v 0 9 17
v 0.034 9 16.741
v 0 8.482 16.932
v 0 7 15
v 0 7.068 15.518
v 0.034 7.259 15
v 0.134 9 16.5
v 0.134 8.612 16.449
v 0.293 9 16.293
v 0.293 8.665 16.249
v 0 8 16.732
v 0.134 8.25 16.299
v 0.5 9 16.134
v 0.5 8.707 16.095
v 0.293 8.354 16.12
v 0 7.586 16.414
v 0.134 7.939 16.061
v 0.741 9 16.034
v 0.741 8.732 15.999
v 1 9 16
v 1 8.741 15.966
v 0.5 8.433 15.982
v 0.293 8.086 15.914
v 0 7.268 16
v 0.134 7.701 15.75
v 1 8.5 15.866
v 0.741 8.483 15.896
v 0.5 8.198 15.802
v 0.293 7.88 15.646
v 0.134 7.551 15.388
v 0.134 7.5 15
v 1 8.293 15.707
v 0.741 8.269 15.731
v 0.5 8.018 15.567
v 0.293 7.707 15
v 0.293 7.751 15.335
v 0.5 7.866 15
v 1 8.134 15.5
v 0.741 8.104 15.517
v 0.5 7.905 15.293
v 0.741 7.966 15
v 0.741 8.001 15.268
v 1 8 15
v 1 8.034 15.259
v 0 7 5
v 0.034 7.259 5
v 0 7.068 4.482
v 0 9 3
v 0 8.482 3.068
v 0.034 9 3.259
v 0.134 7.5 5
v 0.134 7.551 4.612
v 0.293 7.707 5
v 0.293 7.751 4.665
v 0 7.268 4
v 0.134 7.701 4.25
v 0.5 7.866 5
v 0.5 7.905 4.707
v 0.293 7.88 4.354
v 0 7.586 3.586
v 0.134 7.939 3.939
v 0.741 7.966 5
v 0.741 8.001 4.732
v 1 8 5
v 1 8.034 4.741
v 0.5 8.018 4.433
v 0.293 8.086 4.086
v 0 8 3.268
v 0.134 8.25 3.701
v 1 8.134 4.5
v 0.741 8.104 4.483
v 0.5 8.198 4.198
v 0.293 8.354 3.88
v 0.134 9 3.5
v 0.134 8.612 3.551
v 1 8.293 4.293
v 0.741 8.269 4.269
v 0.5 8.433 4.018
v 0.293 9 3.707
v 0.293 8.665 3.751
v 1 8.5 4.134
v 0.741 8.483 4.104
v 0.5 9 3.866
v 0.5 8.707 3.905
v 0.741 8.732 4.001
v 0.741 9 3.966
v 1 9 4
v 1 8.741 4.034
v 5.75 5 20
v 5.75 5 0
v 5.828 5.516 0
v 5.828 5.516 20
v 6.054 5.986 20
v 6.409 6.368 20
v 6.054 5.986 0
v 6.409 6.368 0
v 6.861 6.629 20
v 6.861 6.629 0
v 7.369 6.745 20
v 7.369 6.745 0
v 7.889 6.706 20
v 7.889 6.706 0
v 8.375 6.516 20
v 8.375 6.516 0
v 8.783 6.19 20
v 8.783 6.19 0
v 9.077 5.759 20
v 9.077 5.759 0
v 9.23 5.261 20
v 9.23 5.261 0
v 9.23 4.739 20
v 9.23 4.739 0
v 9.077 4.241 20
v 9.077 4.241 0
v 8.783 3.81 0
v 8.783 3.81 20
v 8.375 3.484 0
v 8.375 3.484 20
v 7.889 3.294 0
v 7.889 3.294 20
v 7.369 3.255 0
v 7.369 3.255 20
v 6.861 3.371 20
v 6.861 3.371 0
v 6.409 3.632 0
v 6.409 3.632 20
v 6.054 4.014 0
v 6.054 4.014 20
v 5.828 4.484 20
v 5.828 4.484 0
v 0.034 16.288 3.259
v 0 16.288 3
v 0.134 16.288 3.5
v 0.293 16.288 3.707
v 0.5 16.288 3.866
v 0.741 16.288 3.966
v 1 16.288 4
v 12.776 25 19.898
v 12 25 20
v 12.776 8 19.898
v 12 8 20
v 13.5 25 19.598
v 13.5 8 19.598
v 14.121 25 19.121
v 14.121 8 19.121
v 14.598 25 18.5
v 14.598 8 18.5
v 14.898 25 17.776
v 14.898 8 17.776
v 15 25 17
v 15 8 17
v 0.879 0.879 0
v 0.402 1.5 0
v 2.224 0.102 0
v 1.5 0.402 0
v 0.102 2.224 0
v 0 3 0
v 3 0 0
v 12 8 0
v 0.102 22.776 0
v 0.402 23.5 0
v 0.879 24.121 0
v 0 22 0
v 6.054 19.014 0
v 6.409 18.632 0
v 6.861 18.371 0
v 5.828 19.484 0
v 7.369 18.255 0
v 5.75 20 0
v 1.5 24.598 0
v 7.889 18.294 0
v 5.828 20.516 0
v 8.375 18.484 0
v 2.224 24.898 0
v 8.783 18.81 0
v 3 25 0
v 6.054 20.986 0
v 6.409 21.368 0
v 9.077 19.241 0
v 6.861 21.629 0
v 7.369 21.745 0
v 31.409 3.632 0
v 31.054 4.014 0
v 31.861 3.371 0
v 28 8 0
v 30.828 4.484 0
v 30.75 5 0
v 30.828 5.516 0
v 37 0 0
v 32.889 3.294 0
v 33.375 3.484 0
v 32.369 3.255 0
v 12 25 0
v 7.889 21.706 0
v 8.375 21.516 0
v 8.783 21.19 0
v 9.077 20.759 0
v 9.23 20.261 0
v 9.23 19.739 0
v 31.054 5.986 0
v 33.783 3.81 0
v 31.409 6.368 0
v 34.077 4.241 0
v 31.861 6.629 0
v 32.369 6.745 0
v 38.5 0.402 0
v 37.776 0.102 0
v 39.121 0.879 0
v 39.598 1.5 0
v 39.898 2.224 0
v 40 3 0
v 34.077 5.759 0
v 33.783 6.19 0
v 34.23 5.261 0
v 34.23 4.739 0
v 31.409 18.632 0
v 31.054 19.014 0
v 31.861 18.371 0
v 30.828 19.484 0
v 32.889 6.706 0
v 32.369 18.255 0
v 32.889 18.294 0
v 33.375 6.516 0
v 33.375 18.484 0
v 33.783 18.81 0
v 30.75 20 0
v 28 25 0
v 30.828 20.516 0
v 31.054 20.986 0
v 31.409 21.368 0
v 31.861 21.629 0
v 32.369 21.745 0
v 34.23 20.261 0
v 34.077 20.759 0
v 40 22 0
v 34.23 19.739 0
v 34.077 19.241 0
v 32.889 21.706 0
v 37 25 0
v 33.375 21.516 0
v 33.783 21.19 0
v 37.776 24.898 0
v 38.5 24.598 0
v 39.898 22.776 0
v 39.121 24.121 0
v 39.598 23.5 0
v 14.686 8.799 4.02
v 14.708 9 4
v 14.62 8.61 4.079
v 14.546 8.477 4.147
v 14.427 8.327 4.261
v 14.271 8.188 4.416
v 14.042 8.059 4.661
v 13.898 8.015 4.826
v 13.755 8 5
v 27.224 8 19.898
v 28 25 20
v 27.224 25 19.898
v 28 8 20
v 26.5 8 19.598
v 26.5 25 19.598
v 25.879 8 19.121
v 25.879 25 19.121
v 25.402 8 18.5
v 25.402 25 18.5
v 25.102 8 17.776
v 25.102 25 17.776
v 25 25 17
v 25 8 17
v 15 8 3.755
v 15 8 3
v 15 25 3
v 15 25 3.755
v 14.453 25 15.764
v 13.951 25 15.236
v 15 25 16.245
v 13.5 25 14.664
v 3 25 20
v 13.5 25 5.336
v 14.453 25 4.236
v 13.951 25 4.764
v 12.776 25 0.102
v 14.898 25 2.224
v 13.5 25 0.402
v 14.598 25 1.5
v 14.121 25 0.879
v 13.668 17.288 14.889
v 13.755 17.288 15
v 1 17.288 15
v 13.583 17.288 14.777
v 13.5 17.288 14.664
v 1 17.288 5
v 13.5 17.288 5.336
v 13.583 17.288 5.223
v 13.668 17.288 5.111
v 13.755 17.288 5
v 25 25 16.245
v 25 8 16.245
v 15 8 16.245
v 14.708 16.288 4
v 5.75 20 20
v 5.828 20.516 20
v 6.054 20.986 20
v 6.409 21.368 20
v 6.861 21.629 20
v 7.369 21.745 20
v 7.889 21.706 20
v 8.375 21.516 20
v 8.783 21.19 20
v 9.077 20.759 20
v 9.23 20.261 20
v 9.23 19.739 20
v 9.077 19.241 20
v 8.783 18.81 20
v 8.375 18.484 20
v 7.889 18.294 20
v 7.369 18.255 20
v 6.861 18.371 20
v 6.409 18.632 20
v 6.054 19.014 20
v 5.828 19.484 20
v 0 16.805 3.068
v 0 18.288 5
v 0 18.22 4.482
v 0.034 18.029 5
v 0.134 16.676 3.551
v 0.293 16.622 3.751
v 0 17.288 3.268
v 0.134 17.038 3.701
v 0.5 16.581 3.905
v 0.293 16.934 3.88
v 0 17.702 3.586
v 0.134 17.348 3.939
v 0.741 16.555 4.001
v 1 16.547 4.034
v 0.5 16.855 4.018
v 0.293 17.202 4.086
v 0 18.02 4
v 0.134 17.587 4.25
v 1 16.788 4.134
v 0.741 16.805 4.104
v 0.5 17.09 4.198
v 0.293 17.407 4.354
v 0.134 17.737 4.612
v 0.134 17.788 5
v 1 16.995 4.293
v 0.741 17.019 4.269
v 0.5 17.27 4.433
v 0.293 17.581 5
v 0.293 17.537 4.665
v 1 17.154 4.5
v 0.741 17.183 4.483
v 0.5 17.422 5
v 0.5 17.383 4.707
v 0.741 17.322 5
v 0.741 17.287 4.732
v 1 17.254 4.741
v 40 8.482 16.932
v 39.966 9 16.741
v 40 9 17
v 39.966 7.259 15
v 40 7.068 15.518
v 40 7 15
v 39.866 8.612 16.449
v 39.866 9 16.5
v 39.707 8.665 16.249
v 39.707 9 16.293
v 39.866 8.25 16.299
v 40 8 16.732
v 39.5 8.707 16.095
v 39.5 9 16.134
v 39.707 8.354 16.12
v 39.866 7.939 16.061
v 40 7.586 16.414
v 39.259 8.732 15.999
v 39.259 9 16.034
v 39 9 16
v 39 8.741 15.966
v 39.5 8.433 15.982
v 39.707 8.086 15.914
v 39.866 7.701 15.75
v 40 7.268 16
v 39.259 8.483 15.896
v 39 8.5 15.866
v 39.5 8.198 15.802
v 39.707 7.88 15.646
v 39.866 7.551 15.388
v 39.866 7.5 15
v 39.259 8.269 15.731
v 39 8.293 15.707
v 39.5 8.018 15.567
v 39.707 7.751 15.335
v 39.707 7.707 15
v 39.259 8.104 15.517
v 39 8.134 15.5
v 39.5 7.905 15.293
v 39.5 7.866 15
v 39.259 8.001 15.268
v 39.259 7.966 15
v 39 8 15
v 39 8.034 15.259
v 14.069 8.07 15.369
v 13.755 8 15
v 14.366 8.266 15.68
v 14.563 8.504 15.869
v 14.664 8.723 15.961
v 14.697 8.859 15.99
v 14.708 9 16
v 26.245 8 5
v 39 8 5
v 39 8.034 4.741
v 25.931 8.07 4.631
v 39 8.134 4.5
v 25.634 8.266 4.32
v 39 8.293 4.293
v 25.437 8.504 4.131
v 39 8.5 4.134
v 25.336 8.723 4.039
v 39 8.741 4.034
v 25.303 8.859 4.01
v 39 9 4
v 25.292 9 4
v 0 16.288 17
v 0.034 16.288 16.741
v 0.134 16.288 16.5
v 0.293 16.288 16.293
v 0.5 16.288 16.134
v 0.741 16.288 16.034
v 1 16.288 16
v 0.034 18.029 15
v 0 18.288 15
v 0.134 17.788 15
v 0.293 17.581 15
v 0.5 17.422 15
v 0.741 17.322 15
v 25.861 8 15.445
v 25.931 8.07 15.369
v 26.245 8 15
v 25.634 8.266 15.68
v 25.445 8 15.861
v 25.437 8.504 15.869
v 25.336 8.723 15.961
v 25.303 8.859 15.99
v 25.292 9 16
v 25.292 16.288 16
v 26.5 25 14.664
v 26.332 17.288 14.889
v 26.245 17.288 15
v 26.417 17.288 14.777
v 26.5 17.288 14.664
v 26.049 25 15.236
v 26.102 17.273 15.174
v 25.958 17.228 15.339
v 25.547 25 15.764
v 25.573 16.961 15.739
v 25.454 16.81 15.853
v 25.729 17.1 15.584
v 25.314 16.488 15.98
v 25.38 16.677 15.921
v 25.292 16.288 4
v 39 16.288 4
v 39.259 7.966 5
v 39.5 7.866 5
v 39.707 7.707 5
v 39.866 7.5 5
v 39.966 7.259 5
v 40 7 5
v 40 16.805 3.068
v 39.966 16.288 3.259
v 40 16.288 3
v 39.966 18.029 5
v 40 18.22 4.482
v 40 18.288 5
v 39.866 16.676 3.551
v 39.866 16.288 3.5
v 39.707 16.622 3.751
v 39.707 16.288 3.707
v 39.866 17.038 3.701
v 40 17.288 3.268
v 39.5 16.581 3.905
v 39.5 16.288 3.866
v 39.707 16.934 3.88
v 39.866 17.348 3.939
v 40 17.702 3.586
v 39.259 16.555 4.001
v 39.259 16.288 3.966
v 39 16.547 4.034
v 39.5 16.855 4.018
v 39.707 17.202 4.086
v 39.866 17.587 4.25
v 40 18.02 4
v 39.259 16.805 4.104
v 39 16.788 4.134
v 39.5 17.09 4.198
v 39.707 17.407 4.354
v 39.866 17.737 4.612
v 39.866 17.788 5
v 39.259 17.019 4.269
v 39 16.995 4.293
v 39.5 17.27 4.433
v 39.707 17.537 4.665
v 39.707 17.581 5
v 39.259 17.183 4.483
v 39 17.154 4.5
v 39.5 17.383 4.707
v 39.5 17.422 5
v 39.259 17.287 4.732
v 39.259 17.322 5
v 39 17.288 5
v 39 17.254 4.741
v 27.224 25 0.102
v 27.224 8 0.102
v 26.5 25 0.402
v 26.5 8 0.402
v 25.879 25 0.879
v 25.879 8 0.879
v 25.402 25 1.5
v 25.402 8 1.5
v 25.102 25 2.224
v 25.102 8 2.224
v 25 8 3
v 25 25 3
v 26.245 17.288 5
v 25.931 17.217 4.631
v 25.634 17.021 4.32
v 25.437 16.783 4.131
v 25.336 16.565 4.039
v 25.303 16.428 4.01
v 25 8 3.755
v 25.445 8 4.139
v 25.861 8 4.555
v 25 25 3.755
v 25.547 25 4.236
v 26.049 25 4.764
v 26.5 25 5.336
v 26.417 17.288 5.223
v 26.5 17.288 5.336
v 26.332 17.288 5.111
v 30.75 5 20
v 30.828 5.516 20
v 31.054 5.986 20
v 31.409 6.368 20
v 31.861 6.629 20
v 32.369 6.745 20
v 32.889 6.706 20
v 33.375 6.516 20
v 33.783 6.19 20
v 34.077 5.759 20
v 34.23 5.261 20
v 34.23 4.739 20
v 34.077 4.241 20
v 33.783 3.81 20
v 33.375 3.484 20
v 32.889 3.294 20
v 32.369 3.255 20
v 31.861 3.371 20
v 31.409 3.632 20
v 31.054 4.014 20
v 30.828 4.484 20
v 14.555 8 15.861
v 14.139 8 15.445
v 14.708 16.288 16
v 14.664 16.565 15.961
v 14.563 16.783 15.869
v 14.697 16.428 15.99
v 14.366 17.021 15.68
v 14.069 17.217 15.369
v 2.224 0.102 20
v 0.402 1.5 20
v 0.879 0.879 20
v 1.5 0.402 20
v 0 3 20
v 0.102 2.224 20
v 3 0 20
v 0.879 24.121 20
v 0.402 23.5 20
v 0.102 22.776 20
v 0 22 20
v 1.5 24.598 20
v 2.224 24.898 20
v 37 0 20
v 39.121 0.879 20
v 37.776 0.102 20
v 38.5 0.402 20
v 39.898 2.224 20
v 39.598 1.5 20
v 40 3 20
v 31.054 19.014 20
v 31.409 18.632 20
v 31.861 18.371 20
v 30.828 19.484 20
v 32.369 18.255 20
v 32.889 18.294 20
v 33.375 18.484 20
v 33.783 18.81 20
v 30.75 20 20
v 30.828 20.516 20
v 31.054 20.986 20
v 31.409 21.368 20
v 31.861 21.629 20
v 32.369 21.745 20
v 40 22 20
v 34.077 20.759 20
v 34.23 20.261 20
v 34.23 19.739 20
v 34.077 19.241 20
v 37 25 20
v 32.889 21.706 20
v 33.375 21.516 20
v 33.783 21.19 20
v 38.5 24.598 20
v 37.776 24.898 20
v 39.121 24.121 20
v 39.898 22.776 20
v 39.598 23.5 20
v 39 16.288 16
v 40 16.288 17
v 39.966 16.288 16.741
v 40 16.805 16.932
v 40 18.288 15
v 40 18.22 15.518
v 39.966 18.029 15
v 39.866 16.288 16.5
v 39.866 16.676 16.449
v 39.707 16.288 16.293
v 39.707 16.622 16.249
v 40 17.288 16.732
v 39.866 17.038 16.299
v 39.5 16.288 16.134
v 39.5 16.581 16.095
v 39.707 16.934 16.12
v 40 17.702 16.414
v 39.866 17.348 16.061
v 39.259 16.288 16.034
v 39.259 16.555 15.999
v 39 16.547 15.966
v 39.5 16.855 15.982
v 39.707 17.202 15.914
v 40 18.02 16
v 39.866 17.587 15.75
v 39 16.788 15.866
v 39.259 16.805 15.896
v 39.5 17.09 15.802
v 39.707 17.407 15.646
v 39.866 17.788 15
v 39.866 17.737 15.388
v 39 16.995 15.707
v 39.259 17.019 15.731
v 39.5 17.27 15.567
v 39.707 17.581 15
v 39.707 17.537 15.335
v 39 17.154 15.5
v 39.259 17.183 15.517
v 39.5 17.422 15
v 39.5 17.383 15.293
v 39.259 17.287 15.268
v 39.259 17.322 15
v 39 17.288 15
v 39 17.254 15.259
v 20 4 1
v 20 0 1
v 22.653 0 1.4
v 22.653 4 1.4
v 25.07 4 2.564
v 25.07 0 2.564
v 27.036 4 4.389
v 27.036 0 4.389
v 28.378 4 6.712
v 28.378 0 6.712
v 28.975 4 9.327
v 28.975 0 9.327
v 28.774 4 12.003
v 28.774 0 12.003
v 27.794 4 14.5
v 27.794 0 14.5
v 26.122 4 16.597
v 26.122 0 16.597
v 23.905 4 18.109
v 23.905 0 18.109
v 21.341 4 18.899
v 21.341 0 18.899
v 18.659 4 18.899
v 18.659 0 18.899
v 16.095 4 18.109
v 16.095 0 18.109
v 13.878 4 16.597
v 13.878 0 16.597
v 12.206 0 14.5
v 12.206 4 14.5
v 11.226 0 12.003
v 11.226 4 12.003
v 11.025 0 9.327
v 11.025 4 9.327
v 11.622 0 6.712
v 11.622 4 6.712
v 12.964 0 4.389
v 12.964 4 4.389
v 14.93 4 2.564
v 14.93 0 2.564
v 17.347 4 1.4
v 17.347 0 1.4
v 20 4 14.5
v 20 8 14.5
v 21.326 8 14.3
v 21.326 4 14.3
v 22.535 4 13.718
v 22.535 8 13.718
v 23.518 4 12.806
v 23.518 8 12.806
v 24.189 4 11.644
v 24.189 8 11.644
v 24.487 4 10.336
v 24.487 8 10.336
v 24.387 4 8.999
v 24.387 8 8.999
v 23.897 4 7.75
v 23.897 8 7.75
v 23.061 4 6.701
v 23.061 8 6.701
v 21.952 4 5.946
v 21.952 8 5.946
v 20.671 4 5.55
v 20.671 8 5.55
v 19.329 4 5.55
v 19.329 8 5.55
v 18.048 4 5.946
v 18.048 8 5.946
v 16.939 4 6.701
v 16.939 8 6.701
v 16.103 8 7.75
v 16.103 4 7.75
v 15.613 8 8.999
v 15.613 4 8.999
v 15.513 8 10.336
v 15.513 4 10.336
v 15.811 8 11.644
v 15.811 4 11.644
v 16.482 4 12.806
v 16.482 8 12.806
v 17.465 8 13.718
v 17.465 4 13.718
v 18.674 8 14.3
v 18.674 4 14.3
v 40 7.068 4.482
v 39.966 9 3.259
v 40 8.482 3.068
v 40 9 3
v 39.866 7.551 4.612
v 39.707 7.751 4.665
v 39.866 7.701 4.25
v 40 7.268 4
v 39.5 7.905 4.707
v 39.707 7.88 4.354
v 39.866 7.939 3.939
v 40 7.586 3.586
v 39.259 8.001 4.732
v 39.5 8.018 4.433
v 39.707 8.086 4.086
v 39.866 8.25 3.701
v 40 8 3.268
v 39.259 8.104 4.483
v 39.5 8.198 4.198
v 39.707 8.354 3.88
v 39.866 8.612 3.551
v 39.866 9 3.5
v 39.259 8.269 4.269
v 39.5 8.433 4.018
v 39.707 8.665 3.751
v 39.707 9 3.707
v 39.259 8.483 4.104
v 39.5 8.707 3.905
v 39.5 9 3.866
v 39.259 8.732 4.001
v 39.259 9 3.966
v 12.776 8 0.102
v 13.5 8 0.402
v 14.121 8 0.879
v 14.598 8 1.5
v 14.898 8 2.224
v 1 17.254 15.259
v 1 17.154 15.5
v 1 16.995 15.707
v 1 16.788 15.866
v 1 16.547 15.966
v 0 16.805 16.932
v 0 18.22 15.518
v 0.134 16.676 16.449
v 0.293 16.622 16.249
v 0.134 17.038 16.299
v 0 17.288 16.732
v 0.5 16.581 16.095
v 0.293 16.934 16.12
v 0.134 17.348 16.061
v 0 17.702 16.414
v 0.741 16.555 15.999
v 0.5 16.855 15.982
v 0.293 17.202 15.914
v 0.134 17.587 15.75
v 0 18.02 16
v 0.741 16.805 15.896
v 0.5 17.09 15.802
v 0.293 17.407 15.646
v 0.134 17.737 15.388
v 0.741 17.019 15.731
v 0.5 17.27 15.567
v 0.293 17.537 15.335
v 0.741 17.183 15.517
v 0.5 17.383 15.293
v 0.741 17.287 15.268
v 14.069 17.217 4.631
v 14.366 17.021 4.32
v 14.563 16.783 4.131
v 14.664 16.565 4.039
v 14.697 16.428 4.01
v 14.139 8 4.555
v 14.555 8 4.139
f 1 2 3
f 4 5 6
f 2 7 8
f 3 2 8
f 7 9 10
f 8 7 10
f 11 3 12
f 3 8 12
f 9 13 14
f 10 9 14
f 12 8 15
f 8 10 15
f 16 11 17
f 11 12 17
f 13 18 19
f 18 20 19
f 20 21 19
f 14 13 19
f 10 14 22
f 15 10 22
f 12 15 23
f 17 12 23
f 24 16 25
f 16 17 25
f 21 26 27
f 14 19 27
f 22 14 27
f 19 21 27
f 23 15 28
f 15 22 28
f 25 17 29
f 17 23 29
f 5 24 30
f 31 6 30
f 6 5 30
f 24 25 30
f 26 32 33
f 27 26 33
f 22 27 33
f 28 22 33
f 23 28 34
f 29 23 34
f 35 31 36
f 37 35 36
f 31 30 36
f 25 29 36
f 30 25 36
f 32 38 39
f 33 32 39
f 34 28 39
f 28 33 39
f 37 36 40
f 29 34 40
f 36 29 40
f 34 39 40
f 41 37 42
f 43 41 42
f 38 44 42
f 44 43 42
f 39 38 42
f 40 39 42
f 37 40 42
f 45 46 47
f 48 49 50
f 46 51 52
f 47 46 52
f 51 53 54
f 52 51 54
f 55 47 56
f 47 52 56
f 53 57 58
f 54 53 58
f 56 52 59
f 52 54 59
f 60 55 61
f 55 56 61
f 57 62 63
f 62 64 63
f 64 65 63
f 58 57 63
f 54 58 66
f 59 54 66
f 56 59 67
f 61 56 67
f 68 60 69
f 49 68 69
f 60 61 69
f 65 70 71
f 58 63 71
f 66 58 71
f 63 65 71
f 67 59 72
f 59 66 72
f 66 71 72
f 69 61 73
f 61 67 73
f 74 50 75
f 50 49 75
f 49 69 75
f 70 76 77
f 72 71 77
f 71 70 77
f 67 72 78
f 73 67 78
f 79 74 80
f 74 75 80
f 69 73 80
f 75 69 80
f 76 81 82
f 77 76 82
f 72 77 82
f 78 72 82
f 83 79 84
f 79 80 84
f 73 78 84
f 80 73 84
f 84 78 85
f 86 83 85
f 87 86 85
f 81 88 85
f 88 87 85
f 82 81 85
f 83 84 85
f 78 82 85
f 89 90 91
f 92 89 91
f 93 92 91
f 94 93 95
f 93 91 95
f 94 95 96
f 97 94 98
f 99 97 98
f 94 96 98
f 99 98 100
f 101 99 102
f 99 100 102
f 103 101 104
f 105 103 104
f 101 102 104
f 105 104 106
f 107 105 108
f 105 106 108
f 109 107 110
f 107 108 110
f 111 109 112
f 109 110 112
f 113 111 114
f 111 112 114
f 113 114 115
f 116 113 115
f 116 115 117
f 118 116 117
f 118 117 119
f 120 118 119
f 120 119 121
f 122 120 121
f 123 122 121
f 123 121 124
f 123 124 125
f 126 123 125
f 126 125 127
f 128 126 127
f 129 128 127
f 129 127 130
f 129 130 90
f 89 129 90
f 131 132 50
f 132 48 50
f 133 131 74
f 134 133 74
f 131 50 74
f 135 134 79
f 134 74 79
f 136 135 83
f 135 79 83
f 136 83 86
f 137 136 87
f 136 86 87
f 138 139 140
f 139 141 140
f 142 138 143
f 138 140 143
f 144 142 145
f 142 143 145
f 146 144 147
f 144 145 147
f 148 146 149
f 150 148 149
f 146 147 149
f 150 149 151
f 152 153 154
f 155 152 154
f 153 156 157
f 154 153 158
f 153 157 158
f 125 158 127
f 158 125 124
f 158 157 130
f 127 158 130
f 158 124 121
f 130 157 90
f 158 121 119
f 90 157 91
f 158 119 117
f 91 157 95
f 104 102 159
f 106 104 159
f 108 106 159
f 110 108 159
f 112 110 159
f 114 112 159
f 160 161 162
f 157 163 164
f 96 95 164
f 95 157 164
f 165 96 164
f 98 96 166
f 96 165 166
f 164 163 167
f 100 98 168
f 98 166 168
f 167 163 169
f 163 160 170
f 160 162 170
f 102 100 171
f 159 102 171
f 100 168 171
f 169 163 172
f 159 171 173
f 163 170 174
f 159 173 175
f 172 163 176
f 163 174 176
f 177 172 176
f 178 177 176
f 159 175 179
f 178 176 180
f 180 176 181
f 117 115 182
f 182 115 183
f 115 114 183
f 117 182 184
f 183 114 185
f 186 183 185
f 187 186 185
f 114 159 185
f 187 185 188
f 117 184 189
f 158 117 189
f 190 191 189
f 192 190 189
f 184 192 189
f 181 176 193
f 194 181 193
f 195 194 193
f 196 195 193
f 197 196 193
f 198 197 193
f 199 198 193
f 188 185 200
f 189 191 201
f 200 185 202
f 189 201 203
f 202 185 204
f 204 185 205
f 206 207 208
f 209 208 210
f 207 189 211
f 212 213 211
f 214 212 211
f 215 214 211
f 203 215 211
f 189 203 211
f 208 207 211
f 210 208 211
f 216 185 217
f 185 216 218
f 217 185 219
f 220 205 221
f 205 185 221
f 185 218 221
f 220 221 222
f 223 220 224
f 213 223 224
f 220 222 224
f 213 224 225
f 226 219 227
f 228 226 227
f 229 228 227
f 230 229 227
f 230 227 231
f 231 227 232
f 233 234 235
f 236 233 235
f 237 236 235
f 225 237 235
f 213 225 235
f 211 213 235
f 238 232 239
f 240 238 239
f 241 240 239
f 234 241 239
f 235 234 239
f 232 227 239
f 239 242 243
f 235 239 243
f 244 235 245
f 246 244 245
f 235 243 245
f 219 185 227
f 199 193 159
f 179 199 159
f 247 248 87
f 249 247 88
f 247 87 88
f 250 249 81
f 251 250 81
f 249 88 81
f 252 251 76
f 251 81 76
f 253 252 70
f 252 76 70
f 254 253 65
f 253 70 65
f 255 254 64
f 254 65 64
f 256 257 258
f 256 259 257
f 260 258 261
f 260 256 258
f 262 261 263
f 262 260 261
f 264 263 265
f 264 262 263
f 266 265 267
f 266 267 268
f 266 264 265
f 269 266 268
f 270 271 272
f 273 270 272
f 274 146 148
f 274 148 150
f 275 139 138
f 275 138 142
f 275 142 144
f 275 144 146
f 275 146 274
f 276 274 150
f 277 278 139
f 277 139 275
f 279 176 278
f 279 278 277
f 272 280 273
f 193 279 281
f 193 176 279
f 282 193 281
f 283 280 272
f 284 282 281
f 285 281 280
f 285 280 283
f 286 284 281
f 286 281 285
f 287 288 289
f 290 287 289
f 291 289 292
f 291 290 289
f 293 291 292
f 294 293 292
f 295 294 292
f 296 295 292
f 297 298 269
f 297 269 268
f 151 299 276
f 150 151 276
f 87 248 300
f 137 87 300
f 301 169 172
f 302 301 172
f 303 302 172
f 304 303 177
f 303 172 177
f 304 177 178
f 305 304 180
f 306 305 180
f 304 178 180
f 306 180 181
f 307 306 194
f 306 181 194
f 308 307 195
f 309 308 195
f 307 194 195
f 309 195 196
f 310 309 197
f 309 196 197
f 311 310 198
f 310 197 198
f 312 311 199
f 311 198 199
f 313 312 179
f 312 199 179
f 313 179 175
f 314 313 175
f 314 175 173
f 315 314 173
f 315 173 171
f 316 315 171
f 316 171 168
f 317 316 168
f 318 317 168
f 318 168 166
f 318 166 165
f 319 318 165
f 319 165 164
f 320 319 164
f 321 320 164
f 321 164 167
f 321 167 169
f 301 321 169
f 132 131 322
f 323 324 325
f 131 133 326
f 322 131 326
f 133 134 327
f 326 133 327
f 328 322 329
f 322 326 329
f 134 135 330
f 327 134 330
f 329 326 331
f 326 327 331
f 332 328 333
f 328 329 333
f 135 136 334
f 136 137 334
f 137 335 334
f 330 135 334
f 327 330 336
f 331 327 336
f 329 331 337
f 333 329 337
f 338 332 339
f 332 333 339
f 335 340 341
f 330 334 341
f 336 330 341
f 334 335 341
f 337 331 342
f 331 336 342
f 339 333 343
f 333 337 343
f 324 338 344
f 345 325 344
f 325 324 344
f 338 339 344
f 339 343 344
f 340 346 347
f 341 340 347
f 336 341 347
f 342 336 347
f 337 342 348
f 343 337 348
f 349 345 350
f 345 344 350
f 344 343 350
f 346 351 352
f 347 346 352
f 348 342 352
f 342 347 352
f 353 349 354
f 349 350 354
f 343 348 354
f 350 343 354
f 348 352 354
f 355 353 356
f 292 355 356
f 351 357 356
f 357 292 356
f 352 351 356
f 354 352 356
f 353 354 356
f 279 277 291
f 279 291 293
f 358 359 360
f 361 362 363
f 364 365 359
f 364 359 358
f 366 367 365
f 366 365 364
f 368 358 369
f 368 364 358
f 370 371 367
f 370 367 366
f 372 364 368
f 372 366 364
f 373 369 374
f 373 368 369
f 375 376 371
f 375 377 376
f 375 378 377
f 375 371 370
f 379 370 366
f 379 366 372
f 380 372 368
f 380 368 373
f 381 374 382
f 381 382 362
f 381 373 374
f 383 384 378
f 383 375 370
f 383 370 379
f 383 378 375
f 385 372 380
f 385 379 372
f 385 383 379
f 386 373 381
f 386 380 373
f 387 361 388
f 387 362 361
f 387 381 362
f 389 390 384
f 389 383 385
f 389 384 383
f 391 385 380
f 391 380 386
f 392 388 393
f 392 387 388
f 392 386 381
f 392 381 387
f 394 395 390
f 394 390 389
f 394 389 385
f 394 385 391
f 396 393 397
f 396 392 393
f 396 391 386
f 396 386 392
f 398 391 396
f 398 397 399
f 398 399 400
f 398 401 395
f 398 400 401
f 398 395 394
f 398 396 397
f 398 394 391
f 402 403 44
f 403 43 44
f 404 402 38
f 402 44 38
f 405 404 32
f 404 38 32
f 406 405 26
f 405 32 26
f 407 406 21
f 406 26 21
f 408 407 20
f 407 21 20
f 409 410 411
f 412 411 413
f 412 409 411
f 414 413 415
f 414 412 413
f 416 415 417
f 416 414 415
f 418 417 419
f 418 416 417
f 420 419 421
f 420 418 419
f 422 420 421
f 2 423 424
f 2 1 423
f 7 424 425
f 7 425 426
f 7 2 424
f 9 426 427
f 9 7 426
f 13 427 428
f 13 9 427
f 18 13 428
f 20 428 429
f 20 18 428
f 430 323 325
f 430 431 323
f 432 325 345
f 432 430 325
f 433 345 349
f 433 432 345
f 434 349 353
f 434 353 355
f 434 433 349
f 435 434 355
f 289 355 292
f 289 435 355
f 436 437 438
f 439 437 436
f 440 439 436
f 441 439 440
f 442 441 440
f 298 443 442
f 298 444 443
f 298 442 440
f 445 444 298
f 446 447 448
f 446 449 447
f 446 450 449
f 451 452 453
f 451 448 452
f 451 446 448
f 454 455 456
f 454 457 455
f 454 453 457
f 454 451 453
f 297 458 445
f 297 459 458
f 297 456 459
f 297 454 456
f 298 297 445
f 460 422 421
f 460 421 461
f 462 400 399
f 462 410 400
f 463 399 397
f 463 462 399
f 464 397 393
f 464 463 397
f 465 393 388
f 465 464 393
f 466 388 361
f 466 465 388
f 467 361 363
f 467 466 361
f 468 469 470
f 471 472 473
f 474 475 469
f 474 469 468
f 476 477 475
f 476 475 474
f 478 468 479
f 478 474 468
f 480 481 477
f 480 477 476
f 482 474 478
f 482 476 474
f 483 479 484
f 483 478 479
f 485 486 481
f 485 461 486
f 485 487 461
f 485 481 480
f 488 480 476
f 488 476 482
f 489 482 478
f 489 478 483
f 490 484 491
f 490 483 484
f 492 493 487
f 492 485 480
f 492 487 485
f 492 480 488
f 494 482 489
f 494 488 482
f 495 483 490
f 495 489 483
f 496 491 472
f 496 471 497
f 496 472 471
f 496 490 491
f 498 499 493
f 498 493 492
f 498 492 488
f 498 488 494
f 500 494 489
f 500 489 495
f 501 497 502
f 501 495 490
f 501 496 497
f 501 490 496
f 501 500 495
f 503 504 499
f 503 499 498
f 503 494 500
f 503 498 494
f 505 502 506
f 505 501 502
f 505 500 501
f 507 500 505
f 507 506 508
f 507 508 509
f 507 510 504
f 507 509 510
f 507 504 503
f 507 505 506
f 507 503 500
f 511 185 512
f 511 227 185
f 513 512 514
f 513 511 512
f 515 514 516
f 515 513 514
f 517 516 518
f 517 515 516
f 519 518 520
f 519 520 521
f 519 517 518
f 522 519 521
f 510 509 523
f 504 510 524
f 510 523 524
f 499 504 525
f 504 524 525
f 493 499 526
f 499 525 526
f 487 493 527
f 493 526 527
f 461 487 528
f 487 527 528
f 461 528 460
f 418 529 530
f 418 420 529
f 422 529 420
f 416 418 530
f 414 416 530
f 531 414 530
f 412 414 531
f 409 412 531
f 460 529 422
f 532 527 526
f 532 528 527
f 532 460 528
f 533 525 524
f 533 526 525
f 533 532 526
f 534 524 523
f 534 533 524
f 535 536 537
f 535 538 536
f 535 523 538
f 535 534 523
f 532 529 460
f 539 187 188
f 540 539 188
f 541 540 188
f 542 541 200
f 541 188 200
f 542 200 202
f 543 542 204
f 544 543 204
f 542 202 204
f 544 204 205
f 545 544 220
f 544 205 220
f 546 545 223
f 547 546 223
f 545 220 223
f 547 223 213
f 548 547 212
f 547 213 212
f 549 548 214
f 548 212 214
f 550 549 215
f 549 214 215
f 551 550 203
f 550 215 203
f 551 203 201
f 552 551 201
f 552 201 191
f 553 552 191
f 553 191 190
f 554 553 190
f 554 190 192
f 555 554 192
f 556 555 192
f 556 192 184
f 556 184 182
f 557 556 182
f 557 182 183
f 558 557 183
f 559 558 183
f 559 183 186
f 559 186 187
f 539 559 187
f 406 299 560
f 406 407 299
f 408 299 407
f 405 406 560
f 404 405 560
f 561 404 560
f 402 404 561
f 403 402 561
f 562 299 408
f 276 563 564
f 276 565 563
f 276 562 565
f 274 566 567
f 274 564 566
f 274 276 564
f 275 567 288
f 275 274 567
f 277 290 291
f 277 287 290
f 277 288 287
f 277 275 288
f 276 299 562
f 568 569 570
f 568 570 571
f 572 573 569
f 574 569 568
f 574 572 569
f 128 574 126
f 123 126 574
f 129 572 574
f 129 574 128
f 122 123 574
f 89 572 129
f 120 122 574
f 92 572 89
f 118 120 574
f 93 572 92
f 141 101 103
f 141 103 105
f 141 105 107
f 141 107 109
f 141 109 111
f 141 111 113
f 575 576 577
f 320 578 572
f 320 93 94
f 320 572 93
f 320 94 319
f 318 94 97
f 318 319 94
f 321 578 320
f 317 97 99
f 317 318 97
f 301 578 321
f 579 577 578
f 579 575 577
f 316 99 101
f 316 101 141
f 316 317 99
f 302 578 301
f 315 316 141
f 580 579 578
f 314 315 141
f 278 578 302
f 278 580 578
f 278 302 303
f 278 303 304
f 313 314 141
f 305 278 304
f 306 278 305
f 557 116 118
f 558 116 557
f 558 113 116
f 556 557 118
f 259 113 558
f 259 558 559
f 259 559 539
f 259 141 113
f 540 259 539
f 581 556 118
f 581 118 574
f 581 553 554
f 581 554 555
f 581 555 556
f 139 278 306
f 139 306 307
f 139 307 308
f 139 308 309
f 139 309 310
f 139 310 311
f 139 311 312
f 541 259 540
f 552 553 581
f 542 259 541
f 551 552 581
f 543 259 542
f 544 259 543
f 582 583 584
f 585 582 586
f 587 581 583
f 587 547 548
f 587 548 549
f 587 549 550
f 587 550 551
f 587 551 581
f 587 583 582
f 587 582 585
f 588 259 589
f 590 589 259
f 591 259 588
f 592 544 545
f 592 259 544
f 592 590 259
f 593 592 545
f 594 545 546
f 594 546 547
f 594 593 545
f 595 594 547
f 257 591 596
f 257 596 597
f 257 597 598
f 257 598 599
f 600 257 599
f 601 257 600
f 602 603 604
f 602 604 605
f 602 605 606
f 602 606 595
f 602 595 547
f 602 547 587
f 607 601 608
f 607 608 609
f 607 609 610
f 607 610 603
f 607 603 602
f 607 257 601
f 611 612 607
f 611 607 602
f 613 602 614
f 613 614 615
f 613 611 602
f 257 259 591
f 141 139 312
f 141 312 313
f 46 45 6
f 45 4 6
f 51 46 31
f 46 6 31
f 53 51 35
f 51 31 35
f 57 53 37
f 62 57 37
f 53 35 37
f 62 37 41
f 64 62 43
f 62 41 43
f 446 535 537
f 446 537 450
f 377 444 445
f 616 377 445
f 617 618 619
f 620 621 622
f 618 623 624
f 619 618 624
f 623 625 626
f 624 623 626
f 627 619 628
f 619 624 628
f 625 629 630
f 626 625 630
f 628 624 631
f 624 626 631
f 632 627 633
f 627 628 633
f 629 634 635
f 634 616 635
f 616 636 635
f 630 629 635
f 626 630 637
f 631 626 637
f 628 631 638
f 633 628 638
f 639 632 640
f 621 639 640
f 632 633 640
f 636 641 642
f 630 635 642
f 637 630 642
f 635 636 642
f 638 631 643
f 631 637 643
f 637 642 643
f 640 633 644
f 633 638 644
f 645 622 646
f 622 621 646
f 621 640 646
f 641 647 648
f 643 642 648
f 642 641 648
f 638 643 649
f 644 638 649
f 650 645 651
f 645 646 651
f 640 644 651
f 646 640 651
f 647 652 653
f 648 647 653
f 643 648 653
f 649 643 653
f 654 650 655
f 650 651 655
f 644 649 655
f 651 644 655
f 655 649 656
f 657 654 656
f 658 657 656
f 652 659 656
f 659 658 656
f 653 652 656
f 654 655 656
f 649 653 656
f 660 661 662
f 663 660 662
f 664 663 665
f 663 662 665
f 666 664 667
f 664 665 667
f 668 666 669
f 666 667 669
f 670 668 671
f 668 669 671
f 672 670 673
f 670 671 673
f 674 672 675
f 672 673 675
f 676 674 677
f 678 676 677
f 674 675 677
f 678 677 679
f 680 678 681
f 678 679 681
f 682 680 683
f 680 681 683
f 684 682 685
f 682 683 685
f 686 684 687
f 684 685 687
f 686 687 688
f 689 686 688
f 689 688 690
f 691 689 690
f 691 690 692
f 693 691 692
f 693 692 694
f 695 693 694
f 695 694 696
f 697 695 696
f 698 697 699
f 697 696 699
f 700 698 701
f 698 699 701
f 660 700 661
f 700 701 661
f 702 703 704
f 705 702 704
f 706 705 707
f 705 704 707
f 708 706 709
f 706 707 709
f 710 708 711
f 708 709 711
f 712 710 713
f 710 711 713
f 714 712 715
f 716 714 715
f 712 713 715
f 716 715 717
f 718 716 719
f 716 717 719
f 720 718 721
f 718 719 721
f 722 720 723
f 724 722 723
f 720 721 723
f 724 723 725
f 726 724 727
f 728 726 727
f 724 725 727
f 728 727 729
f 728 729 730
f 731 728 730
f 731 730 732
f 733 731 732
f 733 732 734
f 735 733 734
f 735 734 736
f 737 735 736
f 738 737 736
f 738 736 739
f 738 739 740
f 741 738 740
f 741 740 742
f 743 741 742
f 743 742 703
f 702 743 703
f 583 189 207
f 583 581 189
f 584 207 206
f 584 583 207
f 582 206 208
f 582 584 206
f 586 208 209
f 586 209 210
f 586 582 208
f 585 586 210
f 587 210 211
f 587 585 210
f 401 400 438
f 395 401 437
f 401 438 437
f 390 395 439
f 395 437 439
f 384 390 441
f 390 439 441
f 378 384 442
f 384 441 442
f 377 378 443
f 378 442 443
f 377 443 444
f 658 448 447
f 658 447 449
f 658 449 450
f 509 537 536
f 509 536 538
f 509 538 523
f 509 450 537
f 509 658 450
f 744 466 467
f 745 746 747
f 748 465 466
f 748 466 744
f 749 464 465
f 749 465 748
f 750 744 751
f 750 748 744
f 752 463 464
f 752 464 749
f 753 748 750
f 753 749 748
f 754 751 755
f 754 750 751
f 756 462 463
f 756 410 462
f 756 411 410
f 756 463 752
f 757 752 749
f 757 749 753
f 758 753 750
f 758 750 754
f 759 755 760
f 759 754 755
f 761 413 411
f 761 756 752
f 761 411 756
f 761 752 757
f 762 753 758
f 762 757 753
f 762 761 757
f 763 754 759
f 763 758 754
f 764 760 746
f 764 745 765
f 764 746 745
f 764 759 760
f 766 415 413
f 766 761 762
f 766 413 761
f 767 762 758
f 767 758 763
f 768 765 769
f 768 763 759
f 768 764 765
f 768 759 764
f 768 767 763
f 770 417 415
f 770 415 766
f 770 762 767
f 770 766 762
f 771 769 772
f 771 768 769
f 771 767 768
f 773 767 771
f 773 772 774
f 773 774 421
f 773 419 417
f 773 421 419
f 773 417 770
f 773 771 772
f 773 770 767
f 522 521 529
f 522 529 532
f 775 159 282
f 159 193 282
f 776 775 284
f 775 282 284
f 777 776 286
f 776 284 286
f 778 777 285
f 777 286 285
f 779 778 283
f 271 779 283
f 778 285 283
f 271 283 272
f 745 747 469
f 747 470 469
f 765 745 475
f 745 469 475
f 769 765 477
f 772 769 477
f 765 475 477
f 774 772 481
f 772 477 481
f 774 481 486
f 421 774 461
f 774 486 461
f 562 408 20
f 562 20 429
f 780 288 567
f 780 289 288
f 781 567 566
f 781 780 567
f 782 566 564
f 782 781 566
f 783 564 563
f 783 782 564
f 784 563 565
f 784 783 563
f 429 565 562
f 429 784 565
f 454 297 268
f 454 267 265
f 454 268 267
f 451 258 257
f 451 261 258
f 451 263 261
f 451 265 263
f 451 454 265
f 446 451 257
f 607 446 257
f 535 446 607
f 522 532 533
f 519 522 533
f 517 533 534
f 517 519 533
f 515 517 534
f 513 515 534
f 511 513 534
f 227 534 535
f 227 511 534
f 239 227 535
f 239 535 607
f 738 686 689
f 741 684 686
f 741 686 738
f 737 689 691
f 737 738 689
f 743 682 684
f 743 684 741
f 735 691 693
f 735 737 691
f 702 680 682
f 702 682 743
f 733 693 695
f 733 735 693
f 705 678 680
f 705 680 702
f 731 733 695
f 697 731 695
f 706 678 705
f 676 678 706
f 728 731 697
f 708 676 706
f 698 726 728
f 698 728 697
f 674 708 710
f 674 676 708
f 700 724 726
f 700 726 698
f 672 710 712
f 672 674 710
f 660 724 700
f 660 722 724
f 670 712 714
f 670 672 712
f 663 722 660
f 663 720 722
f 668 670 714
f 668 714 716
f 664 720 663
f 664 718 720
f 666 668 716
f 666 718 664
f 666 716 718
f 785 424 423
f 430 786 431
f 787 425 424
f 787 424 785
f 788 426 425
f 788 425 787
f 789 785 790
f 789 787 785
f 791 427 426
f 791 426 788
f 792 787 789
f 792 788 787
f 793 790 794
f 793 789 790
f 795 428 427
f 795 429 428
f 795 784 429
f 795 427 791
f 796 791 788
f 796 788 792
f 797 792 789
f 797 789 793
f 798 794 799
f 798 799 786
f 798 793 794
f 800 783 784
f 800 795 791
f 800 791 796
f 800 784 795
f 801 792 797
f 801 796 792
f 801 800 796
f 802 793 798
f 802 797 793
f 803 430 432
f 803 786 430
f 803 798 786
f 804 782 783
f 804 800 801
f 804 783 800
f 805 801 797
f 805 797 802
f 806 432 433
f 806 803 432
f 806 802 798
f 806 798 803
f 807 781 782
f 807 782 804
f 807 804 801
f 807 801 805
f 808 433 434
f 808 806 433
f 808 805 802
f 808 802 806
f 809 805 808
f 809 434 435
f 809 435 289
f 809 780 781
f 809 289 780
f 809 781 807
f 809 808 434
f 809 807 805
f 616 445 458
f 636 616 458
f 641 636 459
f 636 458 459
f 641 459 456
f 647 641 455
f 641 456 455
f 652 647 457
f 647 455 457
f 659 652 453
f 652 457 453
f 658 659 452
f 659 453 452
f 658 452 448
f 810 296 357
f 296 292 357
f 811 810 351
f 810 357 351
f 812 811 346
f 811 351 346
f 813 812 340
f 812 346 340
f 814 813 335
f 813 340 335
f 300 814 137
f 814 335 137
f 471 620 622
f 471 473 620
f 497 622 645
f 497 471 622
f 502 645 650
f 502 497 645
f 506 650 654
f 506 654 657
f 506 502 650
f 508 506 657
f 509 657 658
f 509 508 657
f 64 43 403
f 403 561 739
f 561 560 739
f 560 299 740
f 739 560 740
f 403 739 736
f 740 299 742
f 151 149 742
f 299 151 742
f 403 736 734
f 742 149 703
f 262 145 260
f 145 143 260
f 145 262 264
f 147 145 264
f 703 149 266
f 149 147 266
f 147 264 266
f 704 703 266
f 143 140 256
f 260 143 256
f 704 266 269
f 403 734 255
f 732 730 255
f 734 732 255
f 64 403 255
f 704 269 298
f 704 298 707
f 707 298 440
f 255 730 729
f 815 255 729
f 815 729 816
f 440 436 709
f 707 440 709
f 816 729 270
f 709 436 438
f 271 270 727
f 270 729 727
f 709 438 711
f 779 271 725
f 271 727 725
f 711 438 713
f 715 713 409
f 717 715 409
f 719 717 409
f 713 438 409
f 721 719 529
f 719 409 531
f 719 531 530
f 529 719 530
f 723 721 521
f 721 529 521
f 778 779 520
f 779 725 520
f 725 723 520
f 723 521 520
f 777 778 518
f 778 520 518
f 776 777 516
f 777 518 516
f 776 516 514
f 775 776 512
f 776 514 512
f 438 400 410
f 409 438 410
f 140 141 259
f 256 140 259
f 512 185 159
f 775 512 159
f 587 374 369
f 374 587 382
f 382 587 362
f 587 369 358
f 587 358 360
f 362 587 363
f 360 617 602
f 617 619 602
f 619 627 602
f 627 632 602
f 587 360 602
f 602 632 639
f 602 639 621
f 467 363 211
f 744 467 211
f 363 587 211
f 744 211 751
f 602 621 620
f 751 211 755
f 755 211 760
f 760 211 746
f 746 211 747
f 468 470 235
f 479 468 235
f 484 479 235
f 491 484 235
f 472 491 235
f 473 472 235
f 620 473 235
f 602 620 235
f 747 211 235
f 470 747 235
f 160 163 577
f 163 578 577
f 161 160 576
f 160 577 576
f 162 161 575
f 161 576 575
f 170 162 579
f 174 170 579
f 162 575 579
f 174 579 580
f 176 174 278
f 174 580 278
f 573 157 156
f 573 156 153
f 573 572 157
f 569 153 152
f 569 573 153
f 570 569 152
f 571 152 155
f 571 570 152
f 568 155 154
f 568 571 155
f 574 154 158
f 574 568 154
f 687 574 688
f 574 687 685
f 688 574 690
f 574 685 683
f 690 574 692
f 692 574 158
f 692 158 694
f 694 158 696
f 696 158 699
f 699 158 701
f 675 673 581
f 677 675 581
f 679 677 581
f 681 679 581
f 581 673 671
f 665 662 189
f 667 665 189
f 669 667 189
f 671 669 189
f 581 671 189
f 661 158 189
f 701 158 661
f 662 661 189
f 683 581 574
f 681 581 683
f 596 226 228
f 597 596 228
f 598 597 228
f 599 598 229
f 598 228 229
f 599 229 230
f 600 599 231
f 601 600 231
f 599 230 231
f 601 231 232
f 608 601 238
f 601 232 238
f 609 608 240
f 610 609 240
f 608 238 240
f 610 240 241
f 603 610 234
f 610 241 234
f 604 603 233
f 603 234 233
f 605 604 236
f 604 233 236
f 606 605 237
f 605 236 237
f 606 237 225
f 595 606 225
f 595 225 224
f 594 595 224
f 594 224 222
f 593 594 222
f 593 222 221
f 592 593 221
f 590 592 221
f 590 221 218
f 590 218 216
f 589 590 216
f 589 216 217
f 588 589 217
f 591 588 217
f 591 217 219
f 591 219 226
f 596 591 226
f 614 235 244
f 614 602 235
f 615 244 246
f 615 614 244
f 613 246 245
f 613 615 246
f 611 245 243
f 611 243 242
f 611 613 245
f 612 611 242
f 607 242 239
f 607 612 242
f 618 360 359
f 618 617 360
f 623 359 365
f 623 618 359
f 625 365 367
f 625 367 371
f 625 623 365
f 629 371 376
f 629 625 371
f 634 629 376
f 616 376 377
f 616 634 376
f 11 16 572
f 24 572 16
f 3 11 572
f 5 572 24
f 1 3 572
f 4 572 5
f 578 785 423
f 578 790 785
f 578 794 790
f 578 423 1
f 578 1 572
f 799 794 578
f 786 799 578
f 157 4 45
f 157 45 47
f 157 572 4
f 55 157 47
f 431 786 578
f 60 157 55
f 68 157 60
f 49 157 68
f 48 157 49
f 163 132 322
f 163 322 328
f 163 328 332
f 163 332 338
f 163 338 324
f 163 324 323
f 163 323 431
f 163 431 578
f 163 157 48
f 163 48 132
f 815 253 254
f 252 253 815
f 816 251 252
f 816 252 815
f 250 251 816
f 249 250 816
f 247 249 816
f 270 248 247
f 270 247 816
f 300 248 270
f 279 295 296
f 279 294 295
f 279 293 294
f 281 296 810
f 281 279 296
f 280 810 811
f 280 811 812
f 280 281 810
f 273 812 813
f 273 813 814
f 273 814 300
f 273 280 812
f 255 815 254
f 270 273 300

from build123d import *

# Parameters (mm, degrees)
SKETCH_1_W          = 40
SKETCH_1_H          = 25
EXTRUDE_1_DEPTH     = 20
SKETCH_2_R          = 4.5
CUT_EXTRUDE_1_DEPTH = 52.23475383
CUT_EXTRUDE_2_DEPTH = 17
SKETCH_4_R          = 1.75
SKETCH_4_W          = 10
SKETCH_4_H          = 17
CUT_EXTRUDE_3_DEPTH = 52.23475383
FILLET_1_R          = 3
SKETCH_5_R          = 9
CUT_EXTRUDE_4_DEPTH = 4
SKETCH_7_W          = 12
SKETCH_7_H          = 9.287727203
CUT_EXTRUDE_5_DEPTH = 52.23475383
FILLET_2_R          = 1


with BuildPart() as part:
    # 草图1 → 凸台-拉伸1 (new body)
    with BuildSketch(Plane.XY):
        with Locations((20, 12.5)):
            Rectangle(SKETCH_1_W, SKETCH_1_H)
    extrude(amount=EXTRUDE_1_DEPTH)

    # 草图2 → 切除-拉伸1 (cut, through all)
    with BuildSketch(Plane(origin=(0, 25, 0), x_dir=(1, 0, 0), z_dir=(0, 1, 0))):
        with Locations(Location((20, -10, 0), (0, 0, 270))):
            Circle(SKETCH_2_R)
    extrude(amount=-CUT_EXTRUDE_1_DEPTH, mode=Mode.SUBTRACT)

    # 草图3 → 切除-拉伸2 (cut)
    with BuildSketch(Plane(origin=(0, 25, 0), x_dir=(1, 0, 0), z_dir=(0, 1, 0))):
        with BuildLine():
            Line((15.336310473, -3.5), (24.663689527, -3.5))
            ThreePointArc((24.663689527, -3.5), (25.656854249, -4.343145751), (26.5, -5.336310473))
            Line((26.5, -5.336310473), (26.5, -14.663689527))
            ThreePointArc((26.5, -14.663689527), (25.656854249, -15.656854249), (24.663689527, -16.5))
            Line((24.663689527, -16.5), (15.336310473, -16.5))
            ThreePointArc((15.336310473, -16.5), (14.343145751, -15.656854249), (13.5, -14.663689527))
            Line((13.5, -14.663689527), (13.5, -5.336310473))
            ThreePointArc((13.5, -5.336310473), (14.343145751, -4.343145751), (15.336310473, -3.5))
        make_face()
    extrude(amount=-CUT_EXTRUDE_2_DEPTH, mode=Mode.SUBTRACT)

    # 草图4 → 切除-拉伸3 (cut, through all)
    with BuildSketch(Plane(origin=(0, 0, 0), x_dir=(-1, 0, 0), z_dir=(0, 0, -1))):
        with Locations((-32.5, 20)):
            Circle(SKETCH_4_R)
        with Locations((-32.5, 5)):
            Circle(SKETCH_4_R)
        with Locations((-7.5, 20)):
            Circle(SKETCH_4_R)
        with Locations((-7.5, 5)):
            Circle(SKETCH_4_R)
        with Locations((-20, 16.5)):
            Rectangle(SKETCH_4_W, SKETCH_4_H)
    extrude(amount=-CUT_EXTRUDE_3_DEPTH, mode=Mode.SUBTRACT)

    # 圆角1
    fillet_1_edges = [part.edges().sort_by_distance(p)[0] for p in [
        (25, 16.5, 20),
        (15, 16.5, 20),
        (25, 16.5, 0),
        (15, 16.5, 0),
        (0, 25, 10),
        (40, 25, 10),
        (40, 0, 10),
        (0, 0, 10),
    ]]
    fillet(fillet_1_edges, radius=FILLET_1_R)

    # 草图5 → 切除-拉伸4 (cut)
    with BuildSketch(Plane.XZ):
        with Locations(Location((20, 10, 0), (0, 0, 270))):
            Circle(SKETCH_5_R)
    extrude(amount=-CUT_EXTRUDE_4_DEPTH, mode=Mode.SUBTRACT)

    # 草图7 → 切除-拉伸5 (cut, through all)
    with BuildSketch(Plane(origin=(40, 0, 0), x_dir=(0, 0, -1), z_dir=(1, 0, 0))):
        with Locations((-10, 12.643863601)):
            Rectangle(SKETCH_7_W, SKETCH_7_H)
    extrude(amount=-CUT_EXTRUDE_5_DEPTH, mode=Mode.SUBTRACT)

    # 圆角2
    fillet_2_edges = [part.edges().sort_by_distance(p)[0] for p in [
        (7.354248689, 17.287727203, 4),
        (0, 12.643863602, 4),
        (32.645751311, 17.287727203, 4),
        (32.645751311, 8, 16),
        (7.354248689, 8, 16),
        (0, 12.643863602, 16),
        (32.645751311, 17.287727203, 16),
        (0, 17.287727203, 10),
        (7.354248689, 17.287727203, 16),
        (32.645751311, 8, 4),
        (7.354248689, 8, 4),
        (0, 8, 10),
        (40, 12.643863602, 16),
        (40, 8, 10),
        (40, 12.643863602, 4),
        (40, 17.287727203, 10),
    ]]
    fillet(fillet_2_edges, radius=FILLET_2_R)


solid = part.part
